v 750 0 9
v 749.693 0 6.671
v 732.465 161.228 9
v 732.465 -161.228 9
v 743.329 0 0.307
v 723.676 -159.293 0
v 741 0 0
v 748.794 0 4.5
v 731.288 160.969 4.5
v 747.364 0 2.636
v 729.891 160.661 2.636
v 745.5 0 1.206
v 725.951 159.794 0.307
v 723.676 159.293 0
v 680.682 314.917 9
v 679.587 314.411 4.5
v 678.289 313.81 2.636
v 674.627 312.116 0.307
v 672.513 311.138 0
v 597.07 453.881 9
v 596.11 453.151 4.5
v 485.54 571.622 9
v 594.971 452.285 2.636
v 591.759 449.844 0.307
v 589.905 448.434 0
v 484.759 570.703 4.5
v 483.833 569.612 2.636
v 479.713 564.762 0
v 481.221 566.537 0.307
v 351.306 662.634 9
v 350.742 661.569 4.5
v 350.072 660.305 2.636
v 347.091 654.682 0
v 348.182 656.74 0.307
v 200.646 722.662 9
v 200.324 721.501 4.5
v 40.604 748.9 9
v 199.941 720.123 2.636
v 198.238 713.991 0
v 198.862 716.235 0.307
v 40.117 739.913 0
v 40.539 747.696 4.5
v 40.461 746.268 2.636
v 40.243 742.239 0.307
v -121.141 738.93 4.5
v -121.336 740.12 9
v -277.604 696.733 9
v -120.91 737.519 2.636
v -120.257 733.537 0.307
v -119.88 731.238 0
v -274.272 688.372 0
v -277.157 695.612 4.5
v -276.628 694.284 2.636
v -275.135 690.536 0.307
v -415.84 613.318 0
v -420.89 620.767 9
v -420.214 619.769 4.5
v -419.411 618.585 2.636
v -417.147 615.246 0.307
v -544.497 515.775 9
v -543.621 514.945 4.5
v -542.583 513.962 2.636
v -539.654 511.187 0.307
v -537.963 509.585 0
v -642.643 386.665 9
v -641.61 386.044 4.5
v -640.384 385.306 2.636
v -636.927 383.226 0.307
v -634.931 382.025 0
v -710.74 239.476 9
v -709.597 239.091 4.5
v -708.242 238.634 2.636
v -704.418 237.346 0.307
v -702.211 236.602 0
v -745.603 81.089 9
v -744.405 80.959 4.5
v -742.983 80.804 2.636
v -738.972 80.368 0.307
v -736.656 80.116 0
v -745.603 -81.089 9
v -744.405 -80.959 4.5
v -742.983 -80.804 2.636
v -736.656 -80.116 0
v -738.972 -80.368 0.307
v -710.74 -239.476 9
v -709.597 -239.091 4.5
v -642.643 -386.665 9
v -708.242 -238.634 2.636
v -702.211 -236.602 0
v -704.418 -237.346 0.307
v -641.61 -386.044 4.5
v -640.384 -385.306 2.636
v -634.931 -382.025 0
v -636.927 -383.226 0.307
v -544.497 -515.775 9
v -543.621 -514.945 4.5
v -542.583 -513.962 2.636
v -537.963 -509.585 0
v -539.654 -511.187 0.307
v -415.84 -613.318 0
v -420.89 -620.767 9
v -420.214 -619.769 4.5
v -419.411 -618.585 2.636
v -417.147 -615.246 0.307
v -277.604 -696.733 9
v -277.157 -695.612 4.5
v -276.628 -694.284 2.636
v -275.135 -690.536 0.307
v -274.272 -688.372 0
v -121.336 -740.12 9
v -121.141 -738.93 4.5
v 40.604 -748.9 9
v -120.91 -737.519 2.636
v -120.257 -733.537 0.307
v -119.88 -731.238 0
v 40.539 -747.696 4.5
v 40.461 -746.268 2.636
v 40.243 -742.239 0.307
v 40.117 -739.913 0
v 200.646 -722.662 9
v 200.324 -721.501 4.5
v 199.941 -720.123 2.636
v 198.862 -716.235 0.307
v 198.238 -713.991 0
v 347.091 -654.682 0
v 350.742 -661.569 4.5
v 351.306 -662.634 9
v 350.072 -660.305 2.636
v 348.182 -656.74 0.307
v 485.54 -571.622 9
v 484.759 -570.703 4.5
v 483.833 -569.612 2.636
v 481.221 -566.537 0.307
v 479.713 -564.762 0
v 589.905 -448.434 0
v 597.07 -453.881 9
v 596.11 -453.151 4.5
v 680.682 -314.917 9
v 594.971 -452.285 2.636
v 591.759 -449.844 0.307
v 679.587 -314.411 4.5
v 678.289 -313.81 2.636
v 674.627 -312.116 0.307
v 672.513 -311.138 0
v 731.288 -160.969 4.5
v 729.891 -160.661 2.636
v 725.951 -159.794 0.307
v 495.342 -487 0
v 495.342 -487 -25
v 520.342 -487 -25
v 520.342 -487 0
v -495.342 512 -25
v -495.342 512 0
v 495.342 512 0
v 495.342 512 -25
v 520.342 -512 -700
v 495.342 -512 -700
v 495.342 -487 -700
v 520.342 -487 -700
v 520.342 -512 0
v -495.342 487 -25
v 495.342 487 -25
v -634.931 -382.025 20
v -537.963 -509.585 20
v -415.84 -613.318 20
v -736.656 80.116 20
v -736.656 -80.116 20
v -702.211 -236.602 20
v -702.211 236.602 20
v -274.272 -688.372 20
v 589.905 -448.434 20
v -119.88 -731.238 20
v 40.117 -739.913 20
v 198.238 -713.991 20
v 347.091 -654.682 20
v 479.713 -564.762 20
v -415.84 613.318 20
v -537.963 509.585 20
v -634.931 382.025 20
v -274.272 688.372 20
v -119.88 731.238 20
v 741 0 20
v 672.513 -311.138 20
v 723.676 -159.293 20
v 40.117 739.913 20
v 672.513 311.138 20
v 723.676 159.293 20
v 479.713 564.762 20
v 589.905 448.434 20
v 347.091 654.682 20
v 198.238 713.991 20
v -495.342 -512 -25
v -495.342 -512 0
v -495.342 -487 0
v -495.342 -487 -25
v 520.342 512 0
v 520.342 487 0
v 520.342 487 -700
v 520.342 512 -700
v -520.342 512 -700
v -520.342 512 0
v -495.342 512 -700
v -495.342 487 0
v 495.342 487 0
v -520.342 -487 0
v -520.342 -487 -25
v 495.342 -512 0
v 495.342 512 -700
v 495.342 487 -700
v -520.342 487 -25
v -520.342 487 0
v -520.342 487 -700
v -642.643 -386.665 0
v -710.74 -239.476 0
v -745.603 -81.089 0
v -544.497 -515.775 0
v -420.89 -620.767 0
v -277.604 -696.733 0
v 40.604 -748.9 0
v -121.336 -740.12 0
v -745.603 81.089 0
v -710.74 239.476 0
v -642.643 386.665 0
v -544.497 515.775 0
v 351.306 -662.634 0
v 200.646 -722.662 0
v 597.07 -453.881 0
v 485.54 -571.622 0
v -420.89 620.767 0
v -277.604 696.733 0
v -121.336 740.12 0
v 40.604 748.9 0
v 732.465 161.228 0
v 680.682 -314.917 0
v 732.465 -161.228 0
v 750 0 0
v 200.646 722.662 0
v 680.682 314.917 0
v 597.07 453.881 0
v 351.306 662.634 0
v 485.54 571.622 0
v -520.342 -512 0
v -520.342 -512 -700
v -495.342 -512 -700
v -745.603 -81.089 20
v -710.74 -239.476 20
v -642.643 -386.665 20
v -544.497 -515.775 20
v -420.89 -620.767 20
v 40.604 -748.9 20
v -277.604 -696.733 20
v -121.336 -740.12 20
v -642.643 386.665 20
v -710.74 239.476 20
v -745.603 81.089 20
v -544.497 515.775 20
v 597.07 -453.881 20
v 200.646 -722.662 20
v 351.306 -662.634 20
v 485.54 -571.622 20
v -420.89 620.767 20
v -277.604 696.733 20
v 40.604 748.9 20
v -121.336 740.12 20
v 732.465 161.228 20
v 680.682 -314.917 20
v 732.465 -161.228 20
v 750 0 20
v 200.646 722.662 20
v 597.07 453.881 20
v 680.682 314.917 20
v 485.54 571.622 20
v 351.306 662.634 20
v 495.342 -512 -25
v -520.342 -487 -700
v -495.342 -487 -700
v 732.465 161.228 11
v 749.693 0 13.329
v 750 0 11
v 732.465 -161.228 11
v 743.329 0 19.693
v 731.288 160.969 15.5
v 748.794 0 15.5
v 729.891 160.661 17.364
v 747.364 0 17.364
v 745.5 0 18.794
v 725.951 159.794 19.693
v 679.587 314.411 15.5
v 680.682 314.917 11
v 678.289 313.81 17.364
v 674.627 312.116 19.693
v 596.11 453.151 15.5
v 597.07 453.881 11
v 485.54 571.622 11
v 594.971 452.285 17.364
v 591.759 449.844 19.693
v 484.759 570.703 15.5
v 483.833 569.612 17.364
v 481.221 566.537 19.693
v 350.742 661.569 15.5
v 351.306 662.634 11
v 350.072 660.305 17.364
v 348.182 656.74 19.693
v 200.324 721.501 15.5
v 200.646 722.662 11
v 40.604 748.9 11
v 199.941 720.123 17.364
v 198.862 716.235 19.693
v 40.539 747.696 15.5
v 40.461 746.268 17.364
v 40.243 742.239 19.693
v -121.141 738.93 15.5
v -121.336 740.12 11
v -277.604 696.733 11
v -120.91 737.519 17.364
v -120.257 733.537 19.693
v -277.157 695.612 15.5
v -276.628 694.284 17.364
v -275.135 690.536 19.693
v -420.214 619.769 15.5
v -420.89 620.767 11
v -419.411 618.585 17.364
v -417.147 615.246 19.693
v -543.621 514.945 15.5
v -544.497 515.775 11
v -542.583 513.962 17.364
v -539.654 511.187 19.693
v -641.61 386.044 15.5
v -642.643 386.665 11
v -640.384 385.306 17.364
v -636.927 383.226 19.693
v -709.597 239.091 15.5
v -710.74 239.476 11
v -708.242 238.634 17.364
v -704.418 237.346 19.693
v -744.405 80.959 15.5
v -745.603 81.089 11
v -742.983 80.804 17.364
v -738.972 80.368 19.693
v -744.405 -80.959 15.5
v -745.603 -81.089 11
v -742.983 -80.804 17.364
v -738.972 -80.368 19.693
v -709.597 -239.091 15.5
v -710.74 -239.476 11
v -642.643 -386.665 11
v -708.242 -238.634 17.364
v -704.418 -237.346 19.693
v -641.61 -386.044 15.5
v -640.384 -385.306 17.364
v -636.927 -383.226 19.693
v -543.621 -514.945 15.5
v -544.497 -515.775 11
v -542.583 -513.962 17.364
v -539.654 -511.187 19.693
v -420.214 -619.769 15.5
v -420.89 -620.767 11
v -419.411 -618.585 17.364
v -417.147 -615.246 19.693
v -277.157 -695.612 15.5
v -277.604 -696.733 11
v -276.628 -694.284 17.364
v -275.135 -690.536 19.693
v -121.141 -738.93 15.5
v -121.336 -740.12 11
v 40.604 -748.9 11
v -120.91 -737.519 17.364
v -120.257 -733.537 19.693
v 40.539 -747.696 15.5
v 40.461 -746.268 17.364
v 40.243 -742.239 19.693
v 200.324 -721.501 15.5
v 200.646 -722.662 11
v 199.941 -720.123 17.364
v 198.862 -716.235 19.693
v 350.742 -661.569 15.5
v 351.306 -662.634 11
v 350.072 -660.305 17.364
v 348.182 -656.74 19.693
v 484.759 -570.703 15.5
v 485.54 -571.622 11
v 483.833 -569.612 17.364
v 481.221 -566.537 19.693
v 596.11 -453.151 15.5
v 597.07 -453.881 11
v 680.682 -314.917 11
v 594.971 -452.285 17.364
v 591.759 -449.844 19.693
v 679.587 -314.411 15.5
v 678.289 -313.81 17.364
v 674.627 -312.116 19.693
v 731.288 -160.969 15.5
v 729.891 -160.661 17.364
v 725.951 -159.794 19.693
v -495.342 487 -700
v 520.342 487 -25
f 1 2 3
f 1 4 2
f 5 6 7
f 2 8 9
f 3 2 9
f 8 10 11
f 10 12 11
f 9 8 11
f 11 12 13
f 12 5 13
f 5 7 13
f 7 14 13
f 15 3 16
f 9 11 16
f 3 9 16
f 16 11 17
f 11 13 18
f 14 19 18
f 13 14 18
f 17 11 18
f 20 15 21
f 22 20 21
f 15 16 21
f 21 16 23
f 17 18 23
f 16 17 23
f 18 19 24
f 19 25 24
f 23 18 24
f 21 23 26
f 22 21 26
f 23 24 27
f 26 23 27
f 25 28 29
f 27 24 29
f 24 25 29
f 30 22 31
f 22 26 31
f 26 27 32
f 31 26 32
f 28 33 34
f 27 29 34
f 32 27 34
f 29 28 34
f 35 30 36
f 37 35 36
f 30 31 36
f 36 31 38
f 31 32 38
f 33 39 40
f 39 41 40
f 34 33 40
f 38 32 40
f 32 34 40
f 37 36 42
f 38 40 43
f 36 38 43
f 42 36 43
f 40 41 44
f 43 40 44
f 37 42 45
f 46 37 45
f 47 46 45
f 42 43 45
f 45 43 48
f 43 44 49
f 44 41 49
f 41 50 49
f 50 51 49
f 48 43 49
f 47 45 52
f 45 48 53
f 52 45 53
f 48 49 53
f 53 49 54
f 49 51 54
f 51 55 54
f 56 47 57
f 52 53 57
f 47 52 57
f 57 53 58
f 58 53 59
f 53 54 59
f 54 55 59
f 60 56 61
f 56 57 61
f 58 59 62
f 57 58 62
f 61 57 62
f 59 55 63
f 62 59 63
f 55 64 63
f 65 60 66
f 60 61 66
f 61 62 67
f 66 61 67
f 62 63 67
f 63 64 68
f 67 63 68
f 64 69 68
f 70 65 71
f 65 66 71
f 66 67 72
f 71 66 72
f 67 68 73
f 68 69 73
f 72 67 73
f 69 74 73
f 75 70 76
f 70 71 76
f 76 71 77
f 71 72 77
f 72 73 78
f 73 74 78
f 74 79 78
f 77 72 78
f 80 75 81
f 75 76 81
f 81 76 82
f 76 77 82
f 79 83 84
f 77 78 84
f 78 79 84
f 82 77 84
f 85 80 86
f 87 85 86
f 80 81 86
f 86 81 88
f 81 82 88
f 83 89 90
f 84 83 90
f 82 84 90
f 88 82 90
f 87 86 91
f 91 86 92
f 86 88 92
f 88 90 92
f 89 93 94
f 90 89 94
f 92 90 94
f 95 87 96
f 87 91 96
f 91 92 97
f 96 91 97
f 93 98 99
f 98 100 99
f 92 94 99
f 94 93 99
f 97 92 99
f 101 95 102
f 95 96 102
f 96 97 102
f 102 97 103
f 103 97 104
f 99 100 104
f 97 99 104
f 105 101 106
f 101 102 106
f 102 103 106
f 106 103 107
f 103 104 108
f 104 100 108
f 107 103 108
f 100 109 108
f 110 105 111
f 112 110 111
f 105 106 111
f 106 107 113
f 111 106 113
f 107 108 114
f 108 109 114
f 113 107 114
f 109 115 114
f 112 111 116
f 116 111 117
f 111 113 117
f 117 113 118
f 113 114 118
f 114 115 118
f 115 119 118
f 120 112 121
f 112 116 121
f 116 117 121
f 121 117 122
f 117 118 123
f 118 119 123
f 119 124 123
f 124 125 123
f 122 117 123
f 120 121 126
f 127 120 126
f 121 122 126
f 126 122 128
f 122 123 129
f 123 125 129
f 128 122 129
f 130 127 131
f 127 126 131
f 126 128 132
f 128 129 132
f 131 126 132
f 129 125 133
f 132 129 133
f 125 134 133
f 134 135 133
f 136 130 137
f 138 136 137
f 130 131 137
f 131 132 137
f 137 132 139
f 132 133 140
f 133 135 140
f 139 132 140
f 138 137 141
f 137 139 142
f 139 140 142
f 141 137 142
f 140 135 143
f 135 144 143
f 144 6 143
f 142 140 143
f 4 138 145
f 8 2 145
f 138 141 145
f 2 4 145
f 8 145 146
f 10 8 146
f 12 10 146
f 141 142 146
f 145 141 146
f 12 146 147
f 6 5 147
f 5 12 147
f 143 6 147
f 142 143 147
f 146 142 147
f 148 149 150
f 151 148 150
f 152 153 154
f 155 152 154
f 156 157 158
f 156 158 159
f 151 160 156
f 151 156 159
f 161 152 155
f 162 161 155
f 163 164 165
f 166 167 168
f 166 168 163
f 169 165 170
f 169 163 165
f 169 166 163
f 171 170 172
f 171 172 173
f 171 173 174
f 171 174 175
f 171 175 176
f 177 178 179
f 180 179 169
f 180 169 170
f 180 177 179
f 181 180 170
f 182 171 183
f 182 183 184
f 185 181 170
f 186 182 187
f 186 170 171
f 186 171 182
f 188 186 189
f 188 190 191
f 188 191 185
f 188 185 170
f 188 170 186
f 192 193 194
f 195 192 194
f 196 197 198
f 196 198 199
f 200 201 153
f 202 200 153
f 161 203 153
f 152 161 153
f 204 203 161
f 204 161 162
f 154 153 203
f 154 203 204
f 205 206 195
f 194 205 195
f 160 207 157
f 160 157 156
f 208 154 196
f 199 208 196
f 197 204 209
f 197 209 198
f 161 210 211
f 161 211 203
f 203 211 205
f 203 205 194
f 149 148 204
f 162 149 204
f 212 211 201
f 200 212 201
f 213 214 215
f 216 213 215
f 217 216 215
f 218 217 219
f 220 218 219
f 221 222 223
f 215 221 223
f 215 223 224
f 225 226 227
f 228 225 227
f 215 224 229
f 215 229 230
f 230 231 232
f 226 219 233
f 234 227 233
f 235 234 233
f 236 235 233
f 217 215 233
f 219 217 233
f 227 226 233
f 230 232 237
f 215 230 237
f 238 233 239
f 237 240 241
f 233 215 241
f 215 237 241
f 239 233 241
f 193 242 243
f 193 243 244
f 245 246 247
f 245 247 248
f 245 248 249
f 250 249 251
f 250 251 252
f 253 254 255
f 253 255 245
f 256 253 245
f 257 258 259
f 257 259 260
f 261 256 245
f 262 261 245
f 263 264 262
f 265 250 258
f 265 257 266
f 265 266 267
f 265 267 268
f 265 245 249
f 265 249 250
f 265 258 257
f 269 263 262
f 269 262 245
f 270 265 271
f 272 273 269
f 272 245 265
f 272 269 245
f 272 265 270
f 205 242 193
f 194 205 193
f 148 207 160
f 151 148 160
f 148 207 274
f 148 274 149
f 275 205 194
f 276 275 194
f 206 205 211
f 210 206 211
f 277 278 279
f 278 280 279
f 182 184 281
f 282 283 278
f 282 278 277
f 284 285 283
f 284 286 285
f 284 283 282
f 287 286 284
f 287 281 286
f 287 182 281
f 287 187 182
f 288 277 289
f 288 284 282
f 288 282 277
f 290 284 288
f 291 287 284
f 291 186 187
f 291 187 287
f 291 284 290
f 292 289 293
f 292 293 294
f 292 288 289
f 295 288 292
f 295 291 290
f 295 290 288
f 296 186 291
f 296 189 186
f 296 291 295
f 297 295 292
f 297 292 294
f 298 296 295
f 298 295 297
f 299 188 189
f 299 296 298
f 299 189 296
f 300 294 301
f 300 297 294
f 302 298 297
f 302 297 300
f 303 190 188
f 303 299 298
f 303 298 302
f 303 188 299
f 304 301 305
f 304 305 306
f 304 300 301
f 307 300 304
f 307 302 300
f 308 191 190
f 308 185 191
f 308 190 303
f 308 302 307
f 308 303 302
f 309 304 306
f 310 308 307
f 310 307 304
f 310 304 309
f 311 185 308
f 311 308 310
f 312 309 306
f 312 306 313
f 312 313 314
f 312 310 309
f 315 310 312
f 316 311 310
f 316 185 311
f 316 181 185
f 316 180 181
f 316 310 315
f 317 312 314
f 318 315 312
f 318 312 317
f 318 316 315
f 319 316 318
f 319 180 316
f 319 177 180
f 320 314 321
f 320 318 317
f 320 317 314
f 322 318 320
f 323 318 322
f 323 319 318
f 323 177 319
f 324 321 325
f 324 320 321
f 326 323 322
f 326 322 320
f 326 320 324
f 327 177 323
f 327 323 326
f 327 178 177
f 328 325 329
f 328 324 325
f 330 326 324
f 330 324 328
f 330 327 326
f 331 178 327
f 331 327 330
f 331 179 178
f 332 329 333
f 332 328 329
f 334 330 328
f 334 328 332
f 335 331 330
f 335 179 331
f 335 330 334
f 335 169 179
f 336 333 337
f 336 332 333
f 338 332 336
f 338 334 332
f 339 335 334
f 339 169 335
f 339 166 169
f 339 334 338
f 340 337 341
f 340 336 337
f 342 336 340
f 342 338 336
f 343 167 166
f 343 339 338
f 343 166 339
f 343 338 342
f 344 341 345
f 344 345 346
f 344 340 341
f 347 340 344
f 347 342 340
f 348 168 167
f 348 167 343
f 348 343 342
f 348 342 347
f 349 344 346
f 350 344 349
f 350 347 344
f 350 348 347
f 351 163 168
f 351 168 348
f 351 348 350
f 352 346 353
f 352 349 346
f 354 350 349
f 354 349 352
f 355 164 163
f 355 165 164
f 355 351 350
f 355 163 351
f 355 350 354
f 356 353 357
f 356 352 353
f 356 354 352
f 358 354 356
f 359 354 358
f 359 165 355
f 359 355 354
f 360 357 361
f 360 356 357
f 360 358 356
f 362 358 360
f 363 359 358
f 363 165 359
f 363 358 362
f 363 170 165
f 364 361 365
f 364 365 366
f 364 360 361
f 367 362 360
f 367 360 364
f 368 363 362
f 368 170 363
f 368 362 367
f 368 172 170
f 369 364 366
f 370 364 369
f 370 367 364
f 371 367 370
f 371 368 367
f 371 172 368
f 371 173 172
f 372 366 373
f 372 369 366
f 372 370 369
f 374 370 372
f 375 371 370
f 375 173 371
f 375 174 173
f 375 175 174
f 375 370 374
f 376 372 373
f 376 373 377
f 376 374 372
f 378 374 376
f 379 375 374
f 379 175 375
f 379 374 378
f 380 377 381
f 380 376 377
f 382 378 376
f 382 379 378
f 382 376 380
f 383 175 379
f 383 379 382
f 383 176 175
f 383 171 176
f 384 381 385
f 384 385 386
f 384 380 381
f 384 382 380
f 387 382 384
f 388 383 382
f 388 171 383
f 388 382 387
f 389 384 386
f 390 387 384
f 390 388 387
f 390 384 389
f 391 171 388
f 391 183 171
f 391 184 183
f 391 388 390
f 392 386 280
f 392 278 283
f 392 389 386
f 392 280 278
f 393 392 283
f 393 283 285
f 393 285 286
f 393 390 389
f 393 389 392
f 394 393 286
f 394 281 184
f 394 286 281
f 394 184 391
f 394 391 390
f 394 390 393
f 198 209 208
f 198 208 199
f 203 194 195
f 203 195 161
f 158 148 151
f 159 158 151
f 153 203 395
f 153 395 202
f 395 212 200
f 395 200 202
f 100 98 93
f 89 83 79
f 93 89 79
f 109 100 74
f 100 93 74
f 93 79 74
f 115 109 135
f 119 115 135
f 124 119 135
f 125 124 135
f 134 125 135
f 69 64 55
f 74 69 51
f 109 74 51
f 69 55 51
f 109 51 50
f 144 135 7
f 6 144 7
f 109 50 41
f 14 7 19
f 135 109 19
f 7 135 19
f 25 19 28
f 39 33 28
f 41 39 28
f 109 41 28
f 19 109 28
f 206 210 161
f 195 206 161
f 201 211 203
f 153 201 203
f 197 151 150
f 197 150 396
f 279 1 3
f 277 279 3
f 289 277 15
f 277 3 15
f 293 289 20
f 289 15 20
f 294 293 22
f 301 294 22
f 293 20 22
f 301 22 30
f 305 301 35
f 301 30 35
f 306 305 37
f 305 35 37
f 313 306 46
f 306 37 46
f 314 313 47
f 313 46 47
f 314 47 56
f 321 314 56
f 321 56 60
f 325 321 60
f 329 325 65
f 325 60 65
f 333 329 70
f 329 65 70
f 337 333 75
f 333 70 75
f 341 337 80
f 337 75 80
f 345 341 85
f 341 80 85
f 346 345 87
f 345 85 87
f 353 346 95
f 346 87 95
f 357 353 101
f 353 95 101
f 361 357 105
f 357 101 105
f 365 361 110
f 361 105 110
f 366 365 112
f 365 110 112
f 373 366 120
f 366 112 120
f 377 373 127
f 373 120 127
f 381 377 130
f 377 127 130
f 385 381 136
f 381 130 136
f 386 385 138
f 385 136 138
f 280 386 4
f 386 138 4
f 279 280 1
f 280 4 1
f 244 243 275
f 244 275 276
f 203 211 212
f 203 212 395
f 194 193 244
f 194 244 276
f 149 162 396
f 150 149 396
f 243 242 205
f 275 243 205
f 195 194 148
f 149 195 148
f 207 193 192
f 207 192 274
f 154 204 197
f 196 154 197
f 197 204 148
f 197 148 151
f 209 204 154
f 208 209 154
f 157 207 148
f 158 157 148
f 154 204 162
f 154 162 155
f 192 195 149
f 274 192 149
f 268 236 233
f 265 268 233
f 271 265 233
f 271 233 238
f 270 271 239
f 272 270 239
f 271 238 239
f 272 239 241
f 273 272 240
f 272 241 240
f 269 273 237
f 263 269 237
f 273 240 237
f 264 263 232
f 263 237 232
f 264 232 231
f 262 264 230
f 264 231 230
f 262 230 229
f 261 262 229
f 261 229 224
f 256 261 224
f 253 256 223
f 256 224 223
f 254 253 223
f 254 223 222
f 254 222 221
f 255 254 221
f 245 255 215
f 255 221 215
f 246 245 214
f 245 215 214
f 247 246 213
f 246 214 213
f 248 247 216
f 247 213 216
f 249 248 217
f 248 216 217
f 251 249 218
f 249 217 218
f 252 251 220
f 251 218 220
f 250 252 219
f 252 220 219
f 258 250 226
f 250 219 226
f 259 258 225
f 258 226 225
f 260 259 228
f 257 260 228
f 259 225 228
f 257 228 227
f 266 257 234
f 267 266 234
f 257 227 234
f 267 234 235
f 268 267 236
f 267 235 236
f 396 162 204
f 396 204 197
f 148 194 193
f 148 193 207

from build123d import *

# Parameters (mm, degrees)
F0_W     = 25
F0_H     = 25
F1_DEPTH = 700
F0_W_2   = 990.68439
F0_H_2   = 974
F2_DEPTH = 25
F3_R     = 750
F4_DEPTH = 20
F5_R     = 750
F6_DEPTH = 20
F7_R     = 9


with BuildPart() as f1:
    # F0 (on Top) → F1 (new body)
    with BuildSketch(Plane.XY):
        with Locations((-507.842195, -499.5)):
            Rectangle(F0_W, F0_H)
        with Locations((507.842195, -499.5)):
            Rectangle(F0_W, F0_H)
        with Locations((507.842195, 499.5)):
            Rectangle(F0_W, F0_H)
        with Locations((-507.842195, 499.5)):
            Rectangle(F0_W, F0_H)
    extrude(amount=-F1_DEPTH)


with BuildPart() as f2:
    # F0 (on Top) → F2 (new body)
    with BuildSketch(Plane.XY):
        with Locations((0, -499.5)):
            Rectangle(F0_W_2, F0_H)
        with Locations((507.842195, 0)):
            Rectangle(F0_W, F0_H_2)
        with Locations((0, 499.5)):
            Rectangle(F0_W_2, F0_H)
        with Locations((-507.842195, 0)):
            Rectangle(F0_W, F0_H_2)
    extrude(amount=-F2_DEPTH)


with BuildPart() as f4:
    # F3 (on Top) → F4 (new body)
    with BuildSketch(Plane.XY):
        Circle(F3_R)
    extrude(amount=F4_DEPTH)

    # F7
    f7_edges = [f4.edges().sort_by_distance(p)[0] for p in [
        (750, 0, 10),
        (-750, 0, 0),
        (-750, 0, 20),
    ]]
    fillet(f7_edges, radius=F7_R)


with BuildPart() as f6:
    # F5 (on Top) → F6 (new body)
    with BuildSketch(Plane.XY):
        Circle(F5_R)
    extrude(amount=F6_DEPTH)


solid = Compound([f1.part, f2.part, f4.part, f6.part])
